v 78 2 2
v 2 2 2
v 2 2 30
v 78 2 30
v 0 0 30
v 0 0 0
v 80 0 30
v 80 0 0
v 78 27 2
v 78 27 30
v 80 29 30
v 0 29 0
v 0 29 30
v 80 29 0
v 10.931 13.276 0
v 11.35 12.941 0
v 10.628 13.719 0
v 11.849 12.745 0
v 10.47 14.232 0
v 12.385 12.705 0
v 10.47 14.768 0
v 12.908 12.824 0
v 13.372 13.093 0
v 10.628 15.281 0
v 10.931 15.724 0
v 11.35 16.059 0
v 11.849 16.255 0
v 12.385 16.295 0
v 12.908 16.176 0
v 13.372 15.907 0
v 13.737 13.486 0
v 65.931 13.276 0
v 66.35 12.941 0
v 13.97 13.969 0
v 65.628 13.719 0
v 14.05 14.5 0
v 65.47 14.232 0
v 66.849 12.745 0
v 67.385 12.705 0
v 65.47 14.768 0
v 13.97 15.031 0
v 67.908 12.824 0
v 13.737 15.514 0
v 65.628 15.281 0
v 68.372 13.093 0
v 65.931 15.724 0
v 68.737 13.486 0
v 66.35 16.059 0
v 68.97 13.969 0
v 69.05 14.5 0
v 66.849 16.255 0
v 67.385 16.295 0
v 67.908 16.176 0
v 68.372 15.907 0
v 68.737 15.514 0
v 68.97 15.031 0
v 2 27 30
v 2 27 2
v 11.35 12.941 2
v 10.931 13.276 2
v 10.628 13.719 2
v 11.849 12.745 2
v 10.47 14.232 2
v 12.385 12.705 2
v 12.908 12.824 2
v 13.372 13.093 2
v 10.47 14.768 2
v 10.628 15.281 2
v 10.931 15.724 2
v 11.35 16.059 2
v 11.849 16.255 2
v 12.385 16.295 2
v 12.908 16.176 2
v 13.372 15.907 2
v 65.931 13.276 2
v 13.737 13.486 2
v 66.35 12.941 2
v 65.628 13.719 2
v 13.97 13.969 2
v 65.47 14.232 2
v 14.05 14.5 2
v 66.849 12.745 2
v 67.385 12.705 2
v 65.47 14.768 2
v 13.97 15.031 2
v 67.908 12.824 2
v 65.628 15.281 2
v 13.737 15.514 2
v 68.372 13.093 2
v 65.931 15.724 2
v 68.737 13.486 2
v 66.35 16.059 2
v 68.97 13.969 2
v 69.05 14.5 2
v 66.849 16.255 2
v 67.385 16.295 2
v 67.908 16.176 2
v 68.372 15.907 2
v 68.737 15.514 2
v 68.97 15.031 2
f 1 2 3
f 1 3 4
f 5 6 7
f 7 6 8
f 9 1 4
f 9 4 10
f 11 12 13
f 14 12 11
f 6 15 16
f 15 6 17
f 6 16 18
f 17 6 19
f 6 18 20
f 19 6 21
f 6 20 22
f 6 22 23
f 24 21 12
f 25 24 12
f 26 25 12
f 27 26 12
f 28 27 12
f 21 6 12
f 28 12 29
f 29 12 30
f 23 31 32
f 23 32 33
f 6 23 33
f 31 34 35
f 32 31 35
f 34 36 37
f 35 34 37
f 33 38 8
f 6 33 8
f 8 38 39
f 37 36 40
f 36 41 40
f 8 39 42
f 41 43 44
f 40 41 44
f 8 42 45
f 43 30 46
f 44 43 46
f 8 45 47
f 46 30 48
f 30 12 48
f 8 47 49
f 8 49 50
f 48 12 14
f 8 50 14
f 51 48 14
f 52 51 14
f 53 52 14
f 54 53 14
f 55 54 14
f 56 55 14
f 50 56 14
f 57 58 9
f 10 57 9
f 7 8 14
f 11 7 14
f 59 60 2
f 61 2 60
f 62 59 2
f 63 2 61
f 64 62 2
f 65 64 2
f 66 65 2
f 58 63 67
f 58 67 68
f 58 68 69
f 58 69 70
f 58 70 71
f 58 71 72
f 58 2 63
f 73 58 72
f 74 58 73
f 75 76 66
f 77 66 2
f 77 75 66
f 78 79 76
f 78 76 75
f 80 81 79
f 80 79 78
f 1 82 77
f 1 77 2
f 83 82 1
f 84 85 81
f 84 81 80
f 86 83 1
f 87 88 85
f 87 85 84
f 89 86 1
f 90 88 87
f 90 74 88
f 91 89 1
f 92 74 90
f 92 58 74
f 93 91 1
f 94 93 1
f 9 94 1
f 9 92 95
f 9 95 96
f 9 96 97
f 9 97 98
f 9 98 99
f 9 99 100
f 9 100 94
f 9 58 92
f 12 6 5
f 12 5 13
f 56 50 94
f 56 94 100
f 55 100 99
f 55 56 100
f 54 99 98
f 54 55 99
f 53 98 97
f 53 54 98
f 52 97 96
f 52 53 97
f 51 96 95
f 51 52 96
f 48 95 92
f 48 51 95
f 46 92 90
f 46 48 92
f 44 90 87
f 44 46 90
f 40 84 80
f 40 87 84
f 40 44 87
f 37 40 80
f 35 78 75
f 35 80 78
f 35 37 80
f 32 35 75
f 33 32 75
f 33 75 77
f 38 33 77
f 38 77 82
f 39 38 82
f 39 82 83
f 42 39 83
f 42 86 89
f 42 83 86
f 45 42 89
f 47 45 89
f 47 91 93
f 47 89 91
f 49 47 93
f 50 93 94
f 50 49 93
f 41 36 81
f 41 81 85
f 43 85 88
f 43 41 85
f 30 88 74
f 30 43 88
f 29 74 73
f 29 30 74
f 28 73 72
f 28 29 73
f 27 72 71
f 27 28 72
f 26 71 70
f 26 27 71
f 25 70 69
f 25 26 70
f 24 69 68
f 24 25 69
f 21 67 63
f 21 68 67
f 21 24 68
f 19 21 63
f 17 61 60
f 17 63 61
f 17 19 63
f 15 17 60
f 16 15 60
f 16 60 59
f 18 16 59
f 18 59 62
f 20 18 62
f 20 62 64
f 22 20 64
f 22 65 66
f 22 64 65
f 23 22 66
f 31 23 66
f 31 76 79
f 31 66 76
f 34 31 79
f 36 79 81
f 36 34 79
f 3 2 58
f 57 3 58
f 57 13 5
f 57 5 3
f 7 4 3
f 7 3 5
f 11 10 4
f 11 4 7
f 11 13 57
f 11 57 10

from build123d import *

# Parameters (mm, degrees)
CYLINDER_R     = 1.8
CYLINDER_DEPTH = 50
ARRAY_X_COUNT  = 2
ARRAY_X_PITCH  = 55
BOX001_W       = 76
BOX001_H       = 25
BOX001_DEPTH   = 30
BOX_W          = 80
BOX_H          = 29
BOX_DEPTH      = 30


with BuildPart() as array:
    # Cylinder → Cylinder (new body)
    with BuildSketch(Plane(origin=(12.25, 14.5, -10), x_dir=(1, 0, 0), z_dir=(0, 0, 1))):
        Circle(CYLINDER_R)
    extrude(amount=CYLINDER_DEPTH)

    # Array X: Array ×2


with BuildPart() as array_1:
    add(array.part)
    with Locations(*[(i * ARRAY_X_PITCH, 0, 0) for i in range(1, ARRAY_X_COUNT)]):
        add(array.part)


with BuildPart() as fusion:
    # Box001 → Box001 (new body)
    with BuildSketch(Plane(origin=(2, 2, 2), x_dir=(1, 0, 0), z_dir=(0, 0, 1))):
        with Locations((38, 12.5)):
            Rectangle(BOX001_W, BOX001_H)
    extrude(amount=BOX001_DEPTH)

    # Fusion: union Array
    add(array_1.part)


with BuildPart() as cut:
    # Box → Box (new body)
    with BuildSketch(Plane.XY):
        with Locations((40, 14.5)):
            Rectangle(BOX_W, BOX_H)
    extrude(amount=BOX_DEPTH)

    # Cut: cut Fusion
    add(fusion.part, mode=Mode.SUBTRACT)


solid = cut.part
